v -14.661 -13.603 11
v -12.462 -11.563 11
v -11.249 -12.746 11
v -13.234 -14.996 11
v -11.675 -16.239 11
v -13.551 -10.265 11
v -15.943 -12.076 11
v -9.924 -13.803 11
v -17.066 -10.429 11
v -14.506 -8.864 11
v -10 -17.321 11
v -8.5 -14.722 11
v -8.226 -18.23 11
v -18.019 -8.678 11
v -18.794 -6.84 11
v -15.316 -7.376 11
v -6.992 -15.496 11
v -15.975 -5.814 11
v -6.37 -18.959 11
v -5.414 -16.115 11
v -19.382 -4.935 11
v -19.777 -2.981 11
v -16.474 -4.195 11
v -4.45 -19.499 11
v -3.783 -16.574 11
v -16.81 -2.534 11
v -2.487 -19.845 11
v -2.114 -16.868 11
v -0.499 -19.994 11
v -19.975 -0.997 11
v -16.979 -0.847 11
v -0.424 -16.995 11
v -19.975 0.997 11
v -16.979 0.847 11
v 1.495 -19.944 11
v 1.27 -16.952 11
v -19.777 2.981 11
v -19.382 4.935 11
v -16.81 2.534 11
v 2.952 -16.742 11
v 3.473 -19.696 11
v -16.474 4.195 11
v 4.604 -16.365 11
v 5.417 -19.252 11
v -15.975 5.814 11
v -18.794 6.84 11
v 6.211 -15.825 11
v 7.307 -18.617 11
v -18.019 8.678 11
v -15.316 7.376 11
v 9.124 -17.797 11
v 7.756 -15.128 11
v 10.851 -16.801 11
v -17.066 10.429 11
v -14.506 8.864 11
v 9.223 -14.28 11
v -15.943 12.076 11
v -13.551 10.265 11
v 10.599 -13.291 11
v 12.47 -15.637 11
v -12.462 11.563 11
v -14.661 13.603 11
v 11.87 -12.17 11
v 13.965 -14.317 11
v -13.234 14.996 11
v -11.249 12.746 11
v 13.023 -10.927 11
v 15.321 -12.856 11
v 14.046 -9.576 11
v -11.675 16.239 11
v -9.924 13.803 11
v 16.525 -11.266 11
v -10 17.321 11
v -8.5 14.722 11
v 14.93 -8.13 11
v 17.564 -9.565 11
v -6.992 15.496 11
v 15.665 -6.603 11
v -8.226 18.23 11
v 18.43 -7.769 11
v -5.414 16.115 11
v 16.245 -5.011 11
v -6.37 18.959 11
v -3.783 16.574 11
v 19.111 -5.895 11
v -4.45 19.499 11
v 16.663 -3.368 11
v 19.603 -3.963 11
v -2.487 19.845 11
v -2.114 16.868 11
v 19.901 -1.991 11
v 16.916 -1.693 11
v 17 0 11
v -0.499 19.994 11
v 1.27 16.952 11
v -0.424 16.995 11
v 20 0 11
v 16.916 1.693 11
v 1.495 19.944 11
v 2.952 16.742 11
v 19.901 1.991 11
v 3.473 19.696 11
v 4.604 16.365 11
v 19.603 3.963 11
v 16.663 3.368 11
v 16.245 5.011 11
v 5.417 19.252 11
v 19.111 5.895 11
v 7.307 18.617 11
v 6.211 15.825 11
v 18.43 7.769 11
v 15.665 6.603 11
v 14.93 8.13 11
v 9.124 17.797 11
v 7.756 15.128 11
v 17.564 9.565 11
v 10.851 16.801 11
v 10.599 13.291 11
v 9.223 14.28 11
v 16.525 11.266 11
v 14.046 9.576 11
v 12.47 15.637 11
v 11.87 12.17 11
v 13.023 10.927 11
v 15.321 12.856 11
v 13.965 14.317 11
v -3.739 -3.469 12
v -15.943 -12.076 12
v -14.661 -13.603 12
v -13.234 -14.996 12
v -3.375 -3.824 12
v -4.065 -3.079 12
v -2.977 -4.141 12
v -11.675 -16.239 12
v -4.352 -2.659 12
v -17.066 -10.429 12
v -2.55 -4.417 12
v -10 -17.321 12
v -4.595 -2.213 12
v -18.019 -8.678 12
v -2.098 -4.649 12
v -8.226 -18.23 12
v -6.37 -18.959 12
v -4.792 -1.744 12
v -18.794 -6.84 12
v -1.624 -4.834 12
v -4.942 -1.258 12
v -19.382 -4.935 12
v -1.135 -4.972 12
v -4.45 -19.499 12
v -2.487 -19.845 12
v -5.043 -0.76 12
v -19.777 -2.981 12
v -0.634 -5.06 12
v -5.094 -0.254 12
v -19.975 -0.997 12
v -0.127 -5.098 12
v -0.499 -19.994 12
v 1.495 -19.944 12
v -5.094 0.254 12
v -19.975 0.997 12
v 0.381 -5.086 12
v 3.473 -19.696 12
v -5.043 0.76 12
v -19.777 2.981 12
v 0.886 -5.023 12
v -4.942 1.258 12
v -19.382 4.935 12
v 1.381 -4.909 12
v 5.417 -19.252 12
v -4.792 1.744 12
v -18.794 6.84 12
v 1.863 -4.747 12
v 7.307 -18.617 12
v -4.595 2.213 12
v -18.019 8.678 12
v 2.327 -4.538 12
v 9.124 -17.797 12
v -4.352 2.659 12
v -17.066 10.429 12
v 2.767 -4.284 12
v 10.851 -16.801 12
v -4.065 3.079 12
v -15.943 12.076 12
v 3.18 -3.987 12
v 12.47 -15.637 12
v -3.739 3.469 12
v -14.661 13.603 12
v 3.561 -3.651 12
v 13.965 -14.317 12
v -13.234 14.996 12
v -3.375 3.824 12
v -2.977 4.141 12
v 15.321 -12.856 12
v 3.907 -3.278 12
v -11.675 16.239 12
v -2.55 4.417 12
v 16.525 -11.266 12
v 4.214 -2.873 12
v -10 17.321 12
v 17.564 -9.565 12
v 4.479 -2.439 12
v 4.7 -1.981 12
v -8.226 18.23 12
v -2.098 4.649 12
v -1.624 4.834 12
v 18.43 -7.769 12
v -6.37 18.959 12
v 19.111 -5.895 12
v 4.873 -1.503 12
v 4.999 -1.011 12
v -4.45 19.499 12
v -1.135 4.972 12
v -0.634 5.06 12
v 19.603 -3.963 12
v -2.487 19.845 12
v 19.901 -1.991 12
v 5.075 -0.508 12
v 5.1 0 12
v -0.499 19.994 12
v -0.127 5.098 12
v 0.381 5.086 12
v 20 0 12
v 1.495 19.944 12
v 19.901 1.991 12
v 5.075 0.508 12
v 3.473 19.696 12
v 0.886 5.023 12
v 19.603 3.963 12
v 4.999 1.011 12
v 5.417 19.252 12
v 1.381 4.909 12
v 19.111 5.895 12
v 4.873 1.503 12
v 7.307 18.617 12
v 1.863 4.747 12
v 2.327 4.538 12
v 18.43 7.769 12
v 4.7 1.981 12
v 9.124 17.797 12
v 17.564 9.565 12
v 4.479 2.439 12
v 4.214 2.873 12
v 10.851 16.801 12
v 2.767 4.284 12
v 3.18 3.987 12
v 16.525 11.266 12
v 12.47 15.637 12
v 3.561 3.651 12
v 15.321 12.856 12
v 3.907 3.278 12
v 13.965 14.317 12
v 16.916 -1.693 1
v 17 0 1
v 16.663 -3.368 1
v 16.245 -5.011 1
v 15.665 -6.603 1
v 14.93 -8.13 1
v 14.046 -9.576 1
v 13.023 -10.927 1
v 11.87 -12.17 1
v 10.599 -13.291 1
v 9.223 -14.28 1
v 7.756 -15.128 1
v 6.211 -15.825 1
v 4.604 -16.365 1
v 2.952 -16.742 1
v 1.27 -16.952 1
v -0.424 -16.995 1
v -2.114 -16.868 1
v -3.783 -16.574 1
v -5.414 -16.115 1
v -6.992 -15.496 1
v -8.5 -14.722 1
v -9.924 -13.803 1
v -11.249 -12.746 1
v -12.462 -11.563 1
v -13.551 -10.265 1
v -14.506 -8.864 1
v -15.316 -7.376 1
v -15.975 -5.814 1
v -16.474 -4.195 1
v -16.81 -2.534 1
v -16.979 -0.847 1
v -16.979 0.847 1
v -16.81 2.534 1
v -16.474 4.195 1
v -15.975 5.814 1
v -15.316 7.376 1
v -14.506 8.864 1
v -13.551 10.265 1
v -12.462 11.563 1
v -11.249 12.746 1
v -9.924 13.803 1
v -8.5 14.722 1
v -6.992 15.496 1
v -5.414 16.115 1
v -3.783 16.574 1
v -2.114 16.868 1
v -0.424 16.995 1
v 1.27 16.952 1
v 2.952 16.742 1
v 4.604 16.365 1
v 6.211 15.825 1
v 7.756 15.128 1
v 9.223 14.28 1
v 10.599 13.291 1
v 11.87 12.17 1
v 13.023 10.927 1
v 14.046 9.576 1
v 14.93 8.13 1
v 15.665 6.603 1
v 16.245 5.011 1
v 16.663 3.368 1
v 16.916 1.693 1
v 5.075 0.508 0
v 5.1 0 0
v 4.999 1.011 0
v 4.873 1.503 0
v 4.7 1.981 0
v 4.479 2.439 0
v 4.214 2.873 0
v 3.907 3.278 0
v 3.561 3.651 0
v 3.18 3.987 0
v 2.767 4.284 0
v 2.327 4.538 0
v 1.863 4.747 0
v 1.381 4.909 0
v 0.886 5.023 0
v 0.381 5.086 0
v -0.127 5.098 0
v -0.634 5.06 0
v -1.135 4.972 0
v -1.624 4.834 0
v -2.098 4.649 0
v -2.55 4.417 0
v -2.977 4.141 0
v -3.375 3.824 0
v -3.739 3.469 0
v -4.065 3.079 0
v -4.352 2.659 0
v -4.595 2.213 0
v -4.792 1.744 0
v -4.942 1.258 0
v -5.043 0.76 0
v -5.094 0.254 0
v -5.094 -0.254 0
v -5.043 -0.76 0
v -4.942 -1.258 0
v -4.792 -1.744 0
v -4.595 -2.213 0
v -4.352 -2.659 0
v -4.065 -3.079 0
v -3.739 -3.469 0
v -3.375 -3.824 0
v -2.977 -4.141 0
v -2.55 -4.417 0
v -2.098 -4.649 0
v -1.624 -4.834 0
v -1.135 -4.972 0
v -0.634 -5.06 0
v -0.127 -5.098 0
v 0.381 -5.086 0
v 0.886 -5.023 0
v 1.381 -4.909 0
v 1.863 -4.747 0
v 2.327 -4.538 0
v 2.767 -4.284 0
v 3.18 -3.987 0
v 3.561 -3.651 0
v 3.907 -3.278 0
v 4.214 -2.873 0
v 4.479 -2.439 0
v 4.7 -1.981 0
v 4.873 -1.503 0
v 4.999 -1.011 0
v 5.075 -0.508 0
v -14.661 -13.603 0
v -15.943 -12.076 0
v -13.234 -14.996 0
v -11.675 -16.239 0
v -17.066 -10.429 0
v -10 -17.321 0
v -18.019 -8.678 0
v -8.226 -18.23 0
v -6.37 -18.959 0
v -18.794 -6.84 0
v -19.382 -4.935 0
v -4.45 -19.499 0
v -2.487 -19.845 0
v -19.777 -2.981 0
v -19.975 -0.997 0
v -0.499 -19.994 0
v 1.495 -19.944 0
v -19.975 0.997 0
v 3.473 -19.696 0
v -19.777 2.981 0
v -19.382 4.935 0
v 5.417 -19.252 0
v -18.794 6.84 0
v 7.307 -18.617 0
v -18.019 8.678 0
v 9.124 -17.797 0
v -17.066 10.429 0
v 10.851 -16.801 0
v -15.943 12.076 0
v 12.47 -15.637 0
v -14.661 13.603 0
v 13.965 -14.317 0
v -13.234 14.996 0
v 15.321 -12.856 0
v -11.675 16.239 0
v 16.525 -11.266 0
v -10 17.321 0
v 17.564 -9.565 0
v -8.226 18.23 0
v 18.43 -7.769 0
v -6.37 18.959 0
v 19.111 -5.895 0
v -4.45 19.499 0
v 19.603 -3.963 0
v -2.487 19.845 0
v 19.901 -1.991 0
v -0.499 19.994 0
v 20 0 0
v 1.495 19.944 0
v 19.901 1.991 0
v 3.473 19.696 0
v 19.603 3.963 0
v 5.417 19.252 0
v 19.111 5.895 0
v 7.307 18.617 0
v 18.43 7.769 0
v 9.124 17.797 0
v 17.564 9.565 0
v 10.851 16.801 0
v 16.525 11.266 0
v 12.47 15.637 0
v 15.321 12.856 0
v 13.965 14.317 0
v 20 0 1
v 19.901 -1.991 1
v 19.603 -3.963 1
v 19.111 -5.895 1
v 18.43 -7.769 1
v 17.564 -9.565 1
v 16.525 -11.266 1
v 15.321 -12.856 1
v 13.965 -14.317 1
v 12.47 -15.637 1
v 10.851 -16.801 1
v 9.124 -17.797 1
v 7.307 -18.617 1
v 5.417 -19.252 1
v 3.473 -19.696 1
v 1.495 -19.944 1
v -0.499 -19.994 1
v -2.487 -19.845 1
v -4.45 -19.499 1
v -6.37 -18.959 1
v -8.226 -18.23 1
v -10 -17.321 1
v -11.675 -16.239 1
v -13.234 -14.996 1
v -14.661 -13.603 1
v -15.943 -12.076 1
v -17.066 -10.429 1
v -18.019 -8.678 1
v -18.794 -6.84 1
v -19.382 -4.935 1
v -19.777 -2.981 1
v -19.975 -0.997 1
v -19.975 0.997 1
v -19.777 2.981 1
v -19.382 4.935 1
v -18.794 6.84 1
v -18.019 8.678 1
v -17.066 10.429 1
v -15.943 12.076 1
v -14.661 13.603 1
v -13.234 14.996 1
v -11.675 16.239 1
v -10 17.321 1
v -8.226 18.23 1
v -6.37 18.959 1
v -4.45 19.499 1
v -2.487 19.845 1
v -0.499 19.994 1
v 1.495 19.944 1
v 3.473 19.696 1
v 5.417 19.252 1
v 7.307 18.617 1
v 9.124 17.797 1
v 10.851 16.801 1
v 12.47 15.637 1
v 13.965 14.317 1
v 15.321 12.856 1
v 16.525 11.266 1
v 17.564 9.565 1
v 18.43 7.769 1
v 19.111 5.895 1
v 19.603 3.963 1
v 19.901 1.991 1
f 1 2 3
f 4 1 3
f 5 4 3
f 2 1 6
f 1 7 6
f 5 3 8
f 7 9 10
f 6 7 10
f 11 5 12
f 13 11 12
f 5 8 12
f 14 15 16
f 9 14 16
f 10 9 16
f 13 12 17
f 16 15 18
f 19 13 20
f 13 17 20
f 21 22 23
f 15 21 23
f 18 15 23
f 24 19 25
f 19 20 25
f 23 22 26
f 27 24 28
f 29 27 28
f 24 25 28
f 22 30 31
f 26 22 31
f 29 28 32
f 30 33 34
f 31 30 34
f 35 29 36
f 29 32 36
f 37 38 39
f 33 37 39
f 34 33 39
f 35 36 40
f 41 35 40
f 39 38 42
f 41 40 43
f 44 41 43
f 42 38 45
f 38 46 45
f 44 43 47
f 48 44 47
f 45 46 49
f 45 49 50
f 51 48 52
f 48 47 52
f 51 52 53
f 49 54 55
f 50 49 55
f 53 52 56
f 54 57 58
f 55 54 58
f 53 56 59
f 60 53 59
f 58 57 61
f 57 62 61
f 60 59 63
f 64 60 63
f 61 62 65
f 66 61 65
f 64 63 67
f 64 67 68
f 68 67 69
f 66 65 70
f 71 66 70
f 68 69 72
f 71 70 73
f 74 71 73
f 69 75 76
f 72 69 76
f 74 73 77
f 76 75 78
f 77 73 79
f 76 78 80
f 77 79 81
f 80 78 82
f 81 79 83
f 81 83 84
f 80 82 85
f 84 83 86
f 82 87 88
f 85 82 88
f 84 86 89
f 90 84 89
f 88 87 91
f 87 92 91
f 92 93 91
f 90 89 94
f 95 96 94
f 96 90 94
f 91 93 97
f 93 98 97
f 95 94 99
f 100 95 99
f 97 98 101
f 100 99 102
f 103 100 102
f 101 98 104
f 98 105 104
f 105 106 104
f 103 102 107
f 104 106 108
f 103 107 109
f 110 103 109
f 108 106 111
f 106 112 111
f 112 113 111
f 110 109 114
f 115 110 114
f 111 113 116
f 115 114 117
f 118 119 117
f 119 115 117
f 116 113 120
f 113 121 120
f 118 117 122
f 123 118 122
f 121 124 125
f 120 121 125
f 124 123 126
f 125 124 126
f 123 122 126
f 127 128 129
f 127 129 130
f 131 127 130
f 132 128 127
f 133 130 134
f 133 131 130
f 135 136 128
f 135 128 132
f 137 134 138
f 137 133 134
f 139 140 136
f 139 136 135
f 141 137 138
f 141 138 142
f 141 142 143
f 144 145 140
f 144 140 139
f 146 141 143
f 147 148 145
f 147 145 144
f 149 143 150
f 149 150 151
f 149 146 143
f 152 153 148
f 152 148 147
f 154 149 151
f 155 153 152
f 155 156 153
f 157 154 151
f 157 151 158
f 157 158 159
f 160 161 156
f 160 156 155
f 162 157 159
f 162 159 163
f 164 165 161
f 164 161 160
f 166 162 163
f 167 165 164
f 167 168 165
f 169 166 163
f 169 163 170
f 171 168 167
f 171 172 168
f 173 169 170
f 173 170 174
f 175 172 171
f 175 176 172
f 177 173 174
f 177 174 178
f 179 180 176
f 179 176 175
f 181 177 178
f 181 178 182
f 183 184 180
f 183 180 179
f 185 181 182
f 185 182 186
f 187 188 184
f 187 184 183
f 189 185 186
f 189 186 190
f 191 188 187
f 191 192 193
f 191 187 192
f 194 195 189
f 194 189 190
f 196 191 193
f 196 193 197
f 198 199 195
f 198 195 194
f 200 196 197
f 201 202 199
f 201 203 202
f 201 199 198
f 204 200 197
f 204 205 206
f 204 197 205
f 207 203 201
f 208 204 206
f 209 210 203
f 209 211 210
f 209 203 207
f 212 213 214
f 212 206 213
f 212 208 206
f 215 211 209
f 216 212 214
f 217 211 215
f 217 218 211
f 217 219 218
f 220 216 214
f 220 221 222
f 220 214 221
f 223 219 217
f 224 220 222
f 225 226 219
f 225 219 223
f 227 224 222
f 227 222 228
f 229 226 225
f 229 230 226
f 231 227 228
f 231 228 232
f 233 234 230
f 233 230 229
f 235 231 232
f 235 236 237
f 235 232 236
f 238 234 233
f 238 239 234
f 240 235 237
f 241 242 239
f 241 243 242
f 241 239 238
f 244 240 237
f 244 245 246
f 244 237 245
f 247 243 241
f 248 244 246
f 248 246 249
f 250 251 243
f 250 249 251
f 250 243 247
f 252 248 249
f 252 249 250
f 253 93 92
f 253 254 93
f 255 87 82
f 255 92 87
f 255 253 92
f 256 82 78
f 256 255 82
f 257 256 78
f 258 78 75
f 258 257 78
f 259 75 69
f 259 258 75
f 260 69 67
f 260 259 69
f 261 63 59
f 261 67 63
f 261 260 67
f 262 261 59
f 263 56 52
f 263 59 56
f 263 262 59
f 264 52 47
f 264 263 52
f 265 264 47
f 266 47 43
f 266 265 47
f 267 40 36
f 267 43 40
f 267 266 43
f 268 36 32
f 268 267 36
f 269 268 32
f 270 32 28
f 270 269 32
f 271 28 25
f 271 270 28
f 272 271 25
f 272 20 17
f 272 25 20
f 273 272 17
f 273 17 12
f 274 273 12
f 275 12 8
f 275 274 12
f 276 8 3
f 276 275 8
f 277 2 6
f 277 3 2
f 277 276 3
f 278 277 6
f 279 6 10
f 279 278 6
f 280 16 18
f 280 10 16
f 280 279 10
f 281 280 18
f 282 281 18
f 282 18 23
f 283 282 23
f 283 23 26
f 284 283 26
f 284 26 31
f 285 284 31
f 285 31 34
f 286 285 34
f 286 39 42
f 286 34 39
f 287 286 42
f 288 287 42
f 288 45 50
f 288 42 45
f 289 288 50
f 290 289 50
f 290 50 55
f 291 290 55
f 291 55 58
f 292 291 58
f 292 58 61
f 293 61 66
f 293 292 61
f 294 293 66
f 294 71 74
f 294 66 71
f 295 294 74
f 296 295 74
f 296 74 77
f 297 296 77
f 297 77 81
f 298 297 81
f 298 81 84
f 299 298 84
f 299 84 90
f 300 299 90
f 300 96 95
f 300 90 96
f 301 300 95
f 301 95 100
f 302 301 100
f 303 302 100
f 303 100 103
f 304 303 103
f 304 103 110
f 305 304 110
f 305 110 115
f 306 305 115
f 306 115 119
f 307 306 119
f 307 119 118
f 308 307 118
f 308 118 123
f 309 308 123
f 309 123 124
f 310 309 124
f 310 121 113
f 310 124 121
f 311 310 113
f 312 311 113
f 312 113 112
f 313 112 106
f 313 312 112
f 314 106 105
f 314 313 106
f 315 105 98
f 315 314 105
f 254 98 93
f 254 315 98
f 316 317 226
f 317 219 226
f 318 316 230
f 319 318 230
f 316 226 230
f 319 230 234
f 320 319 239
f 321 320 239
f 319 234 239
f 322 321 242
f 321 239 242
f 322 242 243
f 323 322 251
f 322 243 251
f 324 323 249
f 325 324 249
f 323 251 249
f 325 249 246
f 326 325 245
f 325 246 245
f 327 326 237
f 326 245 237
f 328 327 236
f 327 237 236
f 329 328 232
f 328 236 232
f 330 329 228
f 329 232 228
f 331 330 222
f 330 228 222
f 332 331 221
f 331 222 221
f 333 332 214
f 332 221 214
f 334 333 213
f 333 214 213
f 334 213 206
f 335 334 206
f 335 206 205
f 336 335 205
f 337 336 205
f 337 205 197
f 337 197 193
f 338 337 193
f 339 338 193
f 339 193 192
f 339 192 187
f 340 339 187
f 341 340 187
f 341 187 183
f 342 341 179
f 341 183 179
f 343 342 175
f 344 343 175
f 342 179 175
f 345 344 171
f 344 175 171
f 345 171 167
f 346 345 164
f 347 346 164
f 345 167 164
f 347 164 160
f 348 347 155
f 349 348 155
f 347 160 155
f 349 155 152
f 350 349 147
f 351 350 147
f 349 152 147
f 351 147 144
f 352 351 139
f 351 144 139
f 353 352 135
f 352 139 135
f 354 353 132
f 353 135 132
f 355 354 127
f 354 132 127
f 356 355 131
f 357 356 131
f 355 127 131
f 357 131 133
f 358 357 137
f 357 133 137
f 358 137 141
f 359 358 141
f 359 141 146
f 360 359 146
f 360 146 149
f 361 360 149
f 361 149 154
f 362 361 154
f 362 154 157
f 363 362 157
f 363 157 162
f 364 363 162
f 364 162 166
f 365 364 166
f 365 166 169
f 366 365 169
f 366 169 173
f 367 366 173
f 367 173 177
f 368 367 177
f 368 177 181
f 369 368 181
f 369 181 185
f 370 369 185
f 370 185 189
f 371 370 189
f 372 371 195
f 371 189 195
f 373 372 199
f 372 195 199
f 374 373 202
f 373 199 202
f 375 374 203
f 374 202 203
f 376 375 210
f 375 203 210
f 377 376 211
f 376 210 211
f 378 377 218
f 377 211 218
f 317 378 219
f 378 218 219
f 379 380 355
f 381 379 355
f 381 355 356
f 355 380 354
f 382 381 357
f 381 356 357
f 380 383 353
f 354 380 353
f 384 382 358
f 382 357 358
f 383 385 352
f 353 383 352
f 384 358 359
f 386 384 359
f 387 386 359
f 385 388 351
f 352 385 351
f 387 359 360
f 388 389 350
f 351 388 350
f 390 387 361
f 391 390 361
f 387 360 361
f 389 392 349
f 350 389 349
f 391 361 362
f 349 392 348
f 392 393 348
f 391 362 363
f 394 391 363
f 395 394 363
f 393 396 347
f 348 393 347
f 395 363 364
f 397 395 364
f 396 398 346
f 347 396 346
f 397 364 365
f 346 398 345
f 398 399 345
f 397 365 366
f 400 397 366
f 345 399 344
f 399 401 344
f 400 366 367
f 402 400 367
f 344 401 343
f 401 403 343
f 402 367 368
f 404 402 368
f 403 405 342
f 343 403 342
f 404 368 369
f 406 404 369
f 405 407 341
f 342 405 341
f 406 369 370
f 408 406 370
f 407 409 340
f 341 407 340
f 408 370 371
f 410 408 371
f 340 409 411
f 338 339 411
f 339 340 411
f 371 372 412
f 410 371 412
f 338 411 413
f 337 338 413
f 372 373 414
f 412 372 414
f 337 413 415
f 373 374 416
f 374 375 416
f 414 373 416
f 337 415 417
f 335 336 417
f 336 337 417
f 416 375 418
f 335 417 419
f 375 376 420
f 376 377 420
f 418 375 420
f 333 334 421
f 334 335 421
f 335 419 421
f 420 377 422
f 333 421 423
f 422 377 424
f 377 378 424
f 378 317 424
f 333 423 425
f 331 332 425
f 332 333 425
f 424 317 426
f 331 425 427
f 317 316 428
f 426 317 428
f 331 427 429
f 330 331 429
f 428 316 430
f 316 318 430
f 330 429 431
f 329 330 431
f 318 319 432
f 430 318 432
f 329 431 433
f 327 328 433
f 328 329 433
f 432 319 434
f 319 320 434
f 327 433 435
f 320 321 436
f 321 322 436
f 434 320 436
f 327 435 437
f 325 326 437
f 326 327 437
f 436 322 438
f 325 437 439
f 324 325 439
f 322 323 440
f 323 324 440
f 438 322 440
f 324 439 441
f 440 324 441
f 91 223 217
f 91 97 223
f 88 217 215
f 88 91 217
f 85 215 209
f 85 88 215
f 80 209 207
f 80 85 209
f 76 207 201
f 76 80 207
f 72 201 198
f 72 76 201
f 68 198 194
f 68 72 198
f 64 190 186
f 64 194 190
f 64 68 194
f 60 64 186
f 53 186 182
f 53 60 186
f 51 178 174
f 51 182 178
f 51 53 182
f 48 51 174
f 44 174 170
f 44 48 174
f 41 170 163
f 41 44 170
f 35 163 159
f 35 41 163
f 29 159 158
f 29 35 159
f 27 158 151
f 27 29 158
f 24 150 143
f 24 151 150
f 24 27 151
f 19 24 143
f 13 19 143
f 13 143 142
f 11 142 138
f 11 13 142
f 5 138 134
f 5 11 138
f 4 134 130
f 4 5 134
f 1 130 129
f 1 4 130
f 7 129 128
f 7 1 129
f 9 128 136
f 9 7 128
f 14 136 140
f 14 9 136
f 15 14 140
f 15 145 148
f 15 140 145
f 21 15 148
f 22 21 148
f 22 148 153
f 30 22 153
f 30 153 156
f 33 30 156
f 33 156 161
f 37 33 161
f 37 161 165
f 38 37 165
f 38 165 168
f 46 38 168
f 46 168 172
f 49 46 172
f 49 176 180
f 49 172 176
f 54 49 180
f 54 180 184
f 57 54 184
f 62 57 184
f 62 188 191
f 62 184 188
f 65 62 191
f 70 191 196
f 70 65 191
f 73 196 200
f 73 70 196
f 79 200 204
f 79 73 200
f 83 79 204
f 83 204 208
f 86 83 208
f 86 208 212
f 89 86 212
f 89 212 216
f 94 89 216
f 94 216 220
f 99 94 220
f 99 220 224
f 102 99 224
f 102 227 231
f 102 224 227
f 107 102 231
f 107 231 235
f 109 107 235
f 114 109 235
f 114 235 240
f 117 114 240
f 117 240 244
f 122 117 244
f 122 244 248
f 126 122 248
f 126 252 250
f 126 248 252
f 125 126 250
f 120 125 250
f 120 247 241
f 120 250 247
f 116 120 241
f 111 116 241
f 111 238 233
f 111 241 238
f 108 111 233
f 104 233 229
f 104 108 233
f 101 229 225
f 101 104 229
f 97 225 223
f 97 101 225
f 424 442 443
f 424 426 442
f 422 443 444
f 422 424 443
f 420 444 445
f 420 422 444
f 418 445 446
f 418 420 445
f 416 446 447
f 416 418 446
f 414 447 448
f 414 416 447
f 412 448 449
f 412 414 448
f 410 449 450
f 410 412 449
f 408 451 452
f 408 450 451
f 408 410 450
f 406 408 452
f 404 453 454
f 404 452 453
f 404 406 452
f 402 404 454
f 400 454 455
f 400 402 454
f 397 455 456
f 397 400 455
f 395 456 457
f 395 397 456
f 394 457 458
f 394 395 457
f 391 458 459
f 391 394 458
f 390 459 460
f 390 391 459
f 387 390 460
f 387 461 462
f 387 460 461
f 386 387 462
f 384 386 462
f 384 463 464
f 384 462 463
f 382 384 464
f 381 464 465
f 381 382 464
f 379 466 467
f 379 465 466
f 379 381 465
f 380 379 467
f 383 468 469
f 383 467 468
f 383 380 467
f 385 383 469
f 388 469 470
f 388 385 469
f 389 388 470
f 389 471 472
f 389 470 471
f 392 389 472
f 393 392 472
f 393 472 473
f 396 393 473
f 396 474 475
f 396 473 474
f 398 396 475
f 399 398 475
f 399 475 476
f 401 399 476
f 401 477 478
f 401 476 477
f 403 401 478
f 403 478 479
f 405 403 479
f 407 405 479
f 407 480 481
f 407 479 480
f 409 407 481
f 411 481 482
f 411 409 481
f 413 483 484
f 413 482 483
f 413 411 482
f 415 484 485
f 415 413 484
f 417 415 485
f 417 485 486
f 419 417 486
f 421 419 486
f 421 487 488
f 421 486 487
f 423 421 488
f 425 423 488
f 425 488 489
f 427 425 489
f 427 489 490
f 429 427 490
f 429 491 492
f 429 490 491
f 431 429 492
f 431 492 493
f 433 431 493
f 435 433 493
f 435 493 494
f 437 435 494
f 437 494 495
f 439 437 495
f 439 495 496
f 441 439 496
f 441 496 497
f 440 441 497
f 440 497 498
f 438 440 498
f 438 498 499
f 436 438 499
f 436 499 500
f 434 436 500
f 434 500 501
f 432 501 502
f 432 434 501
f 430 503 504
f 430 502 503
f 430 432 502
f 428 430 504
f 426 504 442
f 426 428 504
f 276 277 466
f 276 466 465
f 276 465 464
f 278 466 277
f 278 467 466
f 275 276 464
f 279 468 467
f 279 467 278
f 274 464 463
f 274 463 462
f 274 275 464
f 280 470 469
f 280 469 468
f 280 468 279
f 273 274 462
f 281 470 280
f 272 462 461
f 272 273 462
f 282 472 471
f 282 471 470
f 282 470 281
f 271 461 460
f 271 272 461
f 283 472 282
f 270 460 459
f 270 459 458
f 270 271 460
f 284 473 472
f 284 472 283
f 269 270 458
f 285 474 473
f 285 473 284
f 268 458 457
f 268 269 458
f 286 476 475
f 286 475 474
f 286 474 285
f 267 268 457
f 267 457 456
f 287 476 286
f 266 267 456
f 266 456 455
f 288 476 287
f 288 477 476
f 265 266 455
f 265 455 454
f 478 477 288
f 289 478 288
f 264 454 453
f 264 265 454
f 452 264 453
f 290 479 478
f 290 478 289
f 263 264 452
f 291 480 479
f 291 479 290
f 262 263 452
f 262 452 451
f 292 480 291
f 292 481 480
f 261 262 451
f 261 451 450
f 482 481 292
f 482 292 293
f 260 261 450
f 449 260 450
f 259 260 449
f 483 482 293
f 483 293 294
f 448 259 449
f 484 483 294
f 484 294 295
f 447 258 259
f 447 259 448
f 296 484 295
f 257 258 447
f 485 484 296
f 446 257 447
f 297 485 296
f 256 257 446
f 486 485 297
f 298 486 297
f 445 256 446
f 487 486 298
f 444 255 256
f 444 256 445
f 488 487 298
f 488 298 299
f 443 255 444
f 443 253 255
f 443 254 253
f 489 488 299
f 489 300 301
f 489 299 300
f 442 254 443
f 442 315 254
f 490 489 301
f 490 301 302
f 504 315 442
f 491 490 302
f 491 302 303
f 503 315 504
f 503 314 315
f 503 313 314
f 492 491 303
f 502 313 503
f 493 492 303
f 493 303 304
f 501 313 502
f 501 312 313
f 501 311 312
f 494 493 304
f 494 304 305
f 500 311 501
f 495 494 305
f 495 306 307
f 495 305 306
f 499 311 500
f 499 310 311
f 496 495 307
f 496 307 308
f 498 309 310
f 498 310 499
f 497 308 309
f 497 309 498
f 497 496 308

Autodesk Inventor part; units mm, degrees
ref_plane "YZ Plane" through (0, 0, 0) normal (1, 0, 0) x (0, 1, 0)
ref_plane "XZ Plane" through (0, 0, 0) normal (0, 1, 0) x (-1, 0, 0)
ref_plane "XY Plane" through (0, 0, 0) normal (0, 0, 1) x (1, 0, 0)
sketch "Skizze1" plane through (0, 0, 0) normal (0, 0, 1) x (1, 0, 0)
  circle A0 centre (0, 0) radius 20
  dimension "d0" = 40
extrude "Extrusion1" add sketch "Skizze1" along normal blind 1
sketch "Skizze2" plane through (0, 0, 1) normal (0, 0, 1) x (1, 0, 0)
  circle A0 centre (0, 0) radius 20 projected
  circle A1 centre (0, 0) radius 17
  dimension "d3" = 34
extrude "Extrusion2" add sketch "Skizze2" along normal blind 10 contours A1
sketch "Skizze3" plane through (0, 0, 11) normal (0, 0, 1) x (1, 0, 0)
  circle A0 centre (0, 0) radius 17 projected
  circle A1 centre (0, 0) radius 20
  dimension "d6" = 40
extrude "Extrusion3" add sketch "Skizze3" along normal blind 1 contours A0 | A1
sketch "Skizze6" plane through (0, 0, 12) normal (0, 0, 1) x (1, 0, 0)
  circle A0 centre (0, 0) radius 20 projected
  circle A1 centre (0, 0) radius 5.1
  dimension "d16" = 10.2
extrude "Extrusion6" cut sketch "Skizze6" against normal through all contours A1
properties part number "Motorstange" material "PC/ABS-Kunststoff"
